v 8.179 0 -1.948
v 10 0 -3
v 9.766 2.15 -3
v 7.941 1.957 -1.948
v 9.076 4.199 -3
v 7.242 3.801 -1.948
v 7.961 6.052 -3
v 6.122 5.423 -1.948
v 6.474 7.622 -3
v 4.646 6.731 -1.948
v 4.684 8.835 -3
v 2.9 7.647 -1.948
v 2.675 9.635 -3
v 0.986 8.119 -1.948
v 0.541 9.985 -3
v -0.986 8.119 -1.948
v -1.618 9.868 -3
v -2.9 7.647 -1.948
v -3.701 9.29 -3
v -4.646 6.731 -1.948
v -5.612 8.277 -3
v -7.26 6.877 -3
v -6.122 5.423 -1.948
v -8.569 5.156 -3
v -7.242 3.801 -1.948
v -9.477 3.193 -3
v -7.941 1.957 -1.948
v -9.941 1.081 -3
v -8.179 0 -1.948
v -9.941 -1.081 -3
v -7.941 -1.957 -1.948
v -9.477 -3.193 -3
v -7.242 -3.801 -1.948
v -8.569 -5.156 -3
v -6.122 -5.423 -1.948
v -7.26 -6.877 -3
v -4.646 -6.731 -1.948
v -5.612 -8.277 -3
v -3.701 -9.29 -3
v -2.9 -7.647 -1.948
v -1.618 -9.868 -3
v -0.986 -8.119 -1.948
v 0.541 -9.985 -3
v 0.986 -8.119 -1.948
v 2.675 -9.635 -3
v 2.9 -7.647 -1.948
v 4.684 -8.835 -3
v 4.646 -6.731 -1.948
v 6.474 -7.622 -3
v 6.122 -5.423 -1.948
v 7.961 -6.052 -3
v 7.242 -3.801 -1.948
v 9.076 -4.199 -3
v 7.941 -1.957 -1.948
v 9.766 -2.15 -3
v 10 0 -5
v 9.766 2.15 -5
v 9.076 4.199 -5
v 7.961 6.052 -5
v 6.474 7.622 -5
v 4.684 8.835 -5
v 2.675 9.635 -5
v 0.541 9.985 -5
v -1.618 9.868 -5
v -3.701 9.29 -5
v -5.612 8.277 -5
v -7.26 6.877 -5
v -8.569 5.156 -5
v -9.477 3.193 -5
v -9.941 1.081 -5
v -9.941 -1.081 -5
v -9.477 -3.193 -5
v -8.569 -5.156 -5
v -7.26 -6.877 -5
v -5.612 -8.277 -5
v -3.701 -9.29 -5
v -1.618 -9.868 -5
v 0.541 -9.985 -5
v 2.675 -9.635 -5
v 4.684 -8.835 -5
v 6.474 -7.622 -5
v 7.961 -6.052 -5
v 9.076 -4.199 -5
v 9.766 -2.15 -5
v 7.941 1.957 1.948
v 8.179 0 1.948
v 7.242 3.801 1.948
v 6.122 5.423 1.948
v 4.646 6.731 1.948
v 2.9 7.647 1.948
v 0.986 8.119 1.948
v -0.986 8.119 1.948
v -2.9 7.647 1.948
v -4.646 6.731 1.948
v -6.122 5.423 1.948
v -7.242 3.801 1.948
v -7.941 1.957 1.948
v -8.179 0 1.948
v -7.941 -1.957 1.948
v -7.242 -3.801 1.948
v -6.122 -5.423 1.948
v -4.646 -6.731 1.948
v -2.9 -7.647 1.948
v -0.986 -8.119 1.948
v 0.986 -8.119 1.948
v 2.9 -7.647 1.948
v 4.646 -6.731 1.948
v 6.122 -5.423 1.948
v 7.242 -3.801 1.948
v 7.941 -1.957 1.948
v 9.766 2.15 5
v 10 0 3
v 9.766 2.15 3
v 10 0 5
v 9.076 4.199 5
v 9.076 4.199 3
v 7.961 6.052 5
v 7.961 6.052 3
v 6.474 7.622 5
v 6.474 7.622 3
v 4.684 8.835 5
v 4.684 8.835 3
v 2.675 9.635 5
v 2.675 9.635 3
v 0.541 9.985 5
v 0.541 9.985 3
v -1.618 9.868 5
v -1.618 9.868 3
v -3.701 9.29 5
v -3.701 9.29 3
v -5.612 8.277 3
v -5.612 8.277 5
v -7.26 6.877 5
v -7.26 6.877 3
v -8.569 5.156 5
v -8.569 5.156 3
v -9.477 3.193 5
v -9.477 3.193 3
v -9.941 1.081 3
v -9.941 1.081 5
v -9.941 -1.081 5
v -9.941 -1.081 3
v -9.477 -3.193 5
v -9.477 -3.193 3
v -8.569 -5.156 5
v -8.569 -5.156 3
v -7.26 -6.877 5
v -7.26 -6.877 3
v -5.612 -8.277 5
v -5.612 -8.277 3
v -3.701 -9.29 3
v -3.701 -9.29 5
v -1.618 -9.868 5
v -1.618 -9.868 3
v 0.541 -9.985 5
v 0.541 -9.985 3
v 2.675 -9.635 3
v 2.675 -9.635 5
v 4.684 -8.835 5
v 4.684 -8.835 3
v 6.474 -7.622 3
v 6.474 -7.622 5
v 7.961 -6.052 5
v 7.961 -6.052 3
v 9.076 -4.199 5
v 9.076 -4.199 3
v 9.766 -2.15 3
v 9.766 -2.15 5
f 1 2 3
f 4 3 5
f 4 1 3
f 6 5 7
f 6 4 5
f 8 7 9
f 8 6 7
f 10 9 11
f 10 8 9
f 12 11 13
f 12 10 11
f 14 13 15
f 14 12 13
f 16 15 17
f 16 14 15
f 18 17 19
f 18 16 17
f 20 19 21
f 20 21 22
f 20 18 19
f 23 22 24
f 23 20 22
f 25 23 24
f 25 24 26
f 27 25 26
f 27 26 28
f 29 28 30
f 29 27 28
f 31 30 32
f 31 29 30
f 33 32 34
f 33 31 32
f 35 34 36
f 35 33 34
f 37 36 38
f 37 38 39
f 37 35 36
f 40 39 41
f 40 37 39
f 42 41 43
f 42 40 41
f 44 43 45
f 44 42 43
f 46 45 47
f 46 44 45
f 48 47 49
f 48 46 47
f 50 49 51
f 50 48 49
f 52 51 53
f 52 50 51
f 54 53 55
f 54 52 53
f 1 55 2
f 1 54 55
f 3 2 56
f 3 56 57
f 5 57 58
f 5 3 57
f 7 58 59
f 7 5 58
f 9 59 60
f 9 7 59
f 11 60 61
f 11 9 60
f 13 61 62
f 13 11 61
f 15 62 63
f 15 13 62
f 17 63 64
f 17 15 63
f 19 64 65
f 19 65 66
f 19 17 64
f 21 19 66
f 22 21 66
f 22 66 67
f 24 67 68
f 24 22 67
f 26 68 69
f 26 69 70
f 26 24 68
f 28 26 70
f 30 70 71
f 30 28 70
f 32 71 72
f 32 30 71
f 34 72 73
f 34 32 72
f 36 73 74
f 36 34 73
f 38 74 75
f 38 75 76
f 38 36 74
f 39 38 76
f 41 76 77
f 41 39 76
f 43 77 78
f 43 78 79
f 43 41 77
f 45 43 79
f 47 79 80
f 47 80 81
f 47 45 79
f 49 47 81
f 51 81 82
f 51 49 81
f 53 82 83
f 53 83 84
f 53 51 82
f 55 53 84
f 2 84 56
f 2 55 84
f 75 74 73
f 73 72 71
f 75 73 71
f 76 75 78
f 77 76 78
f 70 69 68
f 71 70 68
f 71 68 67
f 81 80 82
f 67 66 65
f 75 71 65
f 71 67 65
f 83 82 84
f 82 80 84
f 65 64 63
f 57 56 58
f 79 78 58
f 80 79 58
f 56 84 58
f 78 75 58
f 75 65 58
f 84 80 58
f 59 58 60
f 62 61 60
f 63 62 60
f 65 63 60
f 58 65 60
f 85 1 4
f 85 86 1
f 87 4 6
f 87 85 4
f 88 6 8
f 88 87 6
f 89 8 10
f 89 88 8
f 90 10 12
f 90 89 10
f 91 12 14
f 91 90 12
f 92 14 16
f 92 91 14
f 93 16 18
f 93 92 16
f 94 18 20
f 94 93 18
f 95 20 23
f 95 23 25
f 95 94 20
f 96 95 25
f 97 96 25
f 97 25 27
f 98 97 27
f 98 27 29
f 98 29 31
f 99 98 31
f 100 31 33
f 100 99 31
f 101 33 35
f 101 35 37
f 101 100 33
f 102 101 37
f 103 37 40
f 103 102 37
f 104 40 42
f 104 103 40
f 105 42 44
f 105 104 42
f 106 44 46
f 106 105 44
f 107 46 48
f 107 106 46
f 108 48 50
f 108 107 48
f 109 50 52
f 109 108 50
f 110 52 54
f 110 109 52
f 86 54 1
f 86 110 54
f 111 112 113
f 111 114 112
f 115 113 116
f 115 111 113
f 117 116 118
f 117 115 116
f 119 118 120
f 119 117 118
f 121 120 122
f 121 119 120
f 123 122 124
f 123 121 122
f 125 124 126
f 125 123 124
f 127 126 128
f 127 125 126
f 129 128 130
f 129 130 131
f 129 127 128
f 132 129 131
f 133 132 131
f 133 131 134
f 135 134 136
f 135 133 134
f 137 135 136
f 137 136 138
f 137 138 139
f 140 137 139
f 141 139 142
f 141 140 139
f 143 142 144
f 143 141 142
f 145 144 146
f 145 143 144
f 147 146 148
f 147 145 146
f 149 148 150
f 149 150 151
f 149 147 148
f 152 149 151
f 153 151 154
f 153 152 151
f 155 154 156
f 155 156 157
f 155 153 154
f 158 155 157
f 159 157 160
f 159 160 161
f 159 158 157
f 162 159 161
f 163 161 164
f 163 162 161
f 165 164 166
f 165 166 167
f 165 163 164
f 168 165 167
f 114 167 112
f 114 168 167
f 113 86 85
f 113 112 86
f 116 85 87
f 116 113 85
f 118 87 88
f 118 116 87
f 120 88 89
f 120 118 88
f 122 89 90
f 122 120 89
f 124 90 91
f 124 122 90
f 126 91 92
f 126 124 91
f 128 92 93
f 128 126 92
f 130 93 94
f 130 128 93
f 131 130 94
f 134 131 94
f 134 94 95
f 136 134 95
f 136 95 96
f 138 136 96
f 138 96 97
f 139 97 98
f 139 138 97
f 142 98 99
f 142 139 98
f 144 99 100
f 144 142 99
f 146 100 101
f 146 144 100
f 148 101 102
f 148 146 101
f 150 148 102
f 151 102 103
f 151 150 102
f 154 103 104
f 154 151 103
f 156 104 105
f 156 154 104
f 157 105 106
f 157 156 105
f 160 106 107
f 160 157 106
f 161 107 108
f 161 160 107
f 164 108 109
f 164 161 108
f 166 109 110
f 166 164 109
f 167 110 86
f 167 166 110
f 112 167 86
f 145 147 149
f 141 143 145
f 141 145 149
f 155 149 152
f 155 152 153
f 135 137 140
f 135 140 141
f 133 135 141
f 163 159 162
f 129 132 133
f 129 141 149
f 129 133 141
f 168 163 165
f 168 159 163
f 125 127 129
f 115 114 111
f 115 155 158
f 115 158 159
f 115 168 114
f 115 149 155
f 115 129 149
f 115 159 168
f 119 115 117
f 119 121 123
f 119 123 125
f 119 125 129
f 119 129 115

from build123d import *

# Parameters (mm, degrees)
SKETCH1_R           = 10
BOSS_EXTRUDE1_DEPTH = 5


with BuildPart() as part:
    # Sketch1 → Boss-Extrude1 (new body, symmetric)
    with BuildSketch(Plane.XY):
        Circle(SKETCH1_R)
    extrude(amount=BOSS_EXTRUDE1_DEPTH, both=True)

    # Sketch2 → Cut-Revolve1 (revolve, cut)
    with BuildSketch(Plane(origin=(0, 0, 0), x_dir=(1, 0, 0), z_dir=(0, 1, 0))):
        Polygon((10, 3), (8.178550696, 1.948385754), (8.178550696, -1.948385754), (10, -3), align=None)
    revolve(axis=Axis((0, 0, -6.38791657), (0, 0, 1)), mode=Mode.SUBTRACT)


solid = part.part
